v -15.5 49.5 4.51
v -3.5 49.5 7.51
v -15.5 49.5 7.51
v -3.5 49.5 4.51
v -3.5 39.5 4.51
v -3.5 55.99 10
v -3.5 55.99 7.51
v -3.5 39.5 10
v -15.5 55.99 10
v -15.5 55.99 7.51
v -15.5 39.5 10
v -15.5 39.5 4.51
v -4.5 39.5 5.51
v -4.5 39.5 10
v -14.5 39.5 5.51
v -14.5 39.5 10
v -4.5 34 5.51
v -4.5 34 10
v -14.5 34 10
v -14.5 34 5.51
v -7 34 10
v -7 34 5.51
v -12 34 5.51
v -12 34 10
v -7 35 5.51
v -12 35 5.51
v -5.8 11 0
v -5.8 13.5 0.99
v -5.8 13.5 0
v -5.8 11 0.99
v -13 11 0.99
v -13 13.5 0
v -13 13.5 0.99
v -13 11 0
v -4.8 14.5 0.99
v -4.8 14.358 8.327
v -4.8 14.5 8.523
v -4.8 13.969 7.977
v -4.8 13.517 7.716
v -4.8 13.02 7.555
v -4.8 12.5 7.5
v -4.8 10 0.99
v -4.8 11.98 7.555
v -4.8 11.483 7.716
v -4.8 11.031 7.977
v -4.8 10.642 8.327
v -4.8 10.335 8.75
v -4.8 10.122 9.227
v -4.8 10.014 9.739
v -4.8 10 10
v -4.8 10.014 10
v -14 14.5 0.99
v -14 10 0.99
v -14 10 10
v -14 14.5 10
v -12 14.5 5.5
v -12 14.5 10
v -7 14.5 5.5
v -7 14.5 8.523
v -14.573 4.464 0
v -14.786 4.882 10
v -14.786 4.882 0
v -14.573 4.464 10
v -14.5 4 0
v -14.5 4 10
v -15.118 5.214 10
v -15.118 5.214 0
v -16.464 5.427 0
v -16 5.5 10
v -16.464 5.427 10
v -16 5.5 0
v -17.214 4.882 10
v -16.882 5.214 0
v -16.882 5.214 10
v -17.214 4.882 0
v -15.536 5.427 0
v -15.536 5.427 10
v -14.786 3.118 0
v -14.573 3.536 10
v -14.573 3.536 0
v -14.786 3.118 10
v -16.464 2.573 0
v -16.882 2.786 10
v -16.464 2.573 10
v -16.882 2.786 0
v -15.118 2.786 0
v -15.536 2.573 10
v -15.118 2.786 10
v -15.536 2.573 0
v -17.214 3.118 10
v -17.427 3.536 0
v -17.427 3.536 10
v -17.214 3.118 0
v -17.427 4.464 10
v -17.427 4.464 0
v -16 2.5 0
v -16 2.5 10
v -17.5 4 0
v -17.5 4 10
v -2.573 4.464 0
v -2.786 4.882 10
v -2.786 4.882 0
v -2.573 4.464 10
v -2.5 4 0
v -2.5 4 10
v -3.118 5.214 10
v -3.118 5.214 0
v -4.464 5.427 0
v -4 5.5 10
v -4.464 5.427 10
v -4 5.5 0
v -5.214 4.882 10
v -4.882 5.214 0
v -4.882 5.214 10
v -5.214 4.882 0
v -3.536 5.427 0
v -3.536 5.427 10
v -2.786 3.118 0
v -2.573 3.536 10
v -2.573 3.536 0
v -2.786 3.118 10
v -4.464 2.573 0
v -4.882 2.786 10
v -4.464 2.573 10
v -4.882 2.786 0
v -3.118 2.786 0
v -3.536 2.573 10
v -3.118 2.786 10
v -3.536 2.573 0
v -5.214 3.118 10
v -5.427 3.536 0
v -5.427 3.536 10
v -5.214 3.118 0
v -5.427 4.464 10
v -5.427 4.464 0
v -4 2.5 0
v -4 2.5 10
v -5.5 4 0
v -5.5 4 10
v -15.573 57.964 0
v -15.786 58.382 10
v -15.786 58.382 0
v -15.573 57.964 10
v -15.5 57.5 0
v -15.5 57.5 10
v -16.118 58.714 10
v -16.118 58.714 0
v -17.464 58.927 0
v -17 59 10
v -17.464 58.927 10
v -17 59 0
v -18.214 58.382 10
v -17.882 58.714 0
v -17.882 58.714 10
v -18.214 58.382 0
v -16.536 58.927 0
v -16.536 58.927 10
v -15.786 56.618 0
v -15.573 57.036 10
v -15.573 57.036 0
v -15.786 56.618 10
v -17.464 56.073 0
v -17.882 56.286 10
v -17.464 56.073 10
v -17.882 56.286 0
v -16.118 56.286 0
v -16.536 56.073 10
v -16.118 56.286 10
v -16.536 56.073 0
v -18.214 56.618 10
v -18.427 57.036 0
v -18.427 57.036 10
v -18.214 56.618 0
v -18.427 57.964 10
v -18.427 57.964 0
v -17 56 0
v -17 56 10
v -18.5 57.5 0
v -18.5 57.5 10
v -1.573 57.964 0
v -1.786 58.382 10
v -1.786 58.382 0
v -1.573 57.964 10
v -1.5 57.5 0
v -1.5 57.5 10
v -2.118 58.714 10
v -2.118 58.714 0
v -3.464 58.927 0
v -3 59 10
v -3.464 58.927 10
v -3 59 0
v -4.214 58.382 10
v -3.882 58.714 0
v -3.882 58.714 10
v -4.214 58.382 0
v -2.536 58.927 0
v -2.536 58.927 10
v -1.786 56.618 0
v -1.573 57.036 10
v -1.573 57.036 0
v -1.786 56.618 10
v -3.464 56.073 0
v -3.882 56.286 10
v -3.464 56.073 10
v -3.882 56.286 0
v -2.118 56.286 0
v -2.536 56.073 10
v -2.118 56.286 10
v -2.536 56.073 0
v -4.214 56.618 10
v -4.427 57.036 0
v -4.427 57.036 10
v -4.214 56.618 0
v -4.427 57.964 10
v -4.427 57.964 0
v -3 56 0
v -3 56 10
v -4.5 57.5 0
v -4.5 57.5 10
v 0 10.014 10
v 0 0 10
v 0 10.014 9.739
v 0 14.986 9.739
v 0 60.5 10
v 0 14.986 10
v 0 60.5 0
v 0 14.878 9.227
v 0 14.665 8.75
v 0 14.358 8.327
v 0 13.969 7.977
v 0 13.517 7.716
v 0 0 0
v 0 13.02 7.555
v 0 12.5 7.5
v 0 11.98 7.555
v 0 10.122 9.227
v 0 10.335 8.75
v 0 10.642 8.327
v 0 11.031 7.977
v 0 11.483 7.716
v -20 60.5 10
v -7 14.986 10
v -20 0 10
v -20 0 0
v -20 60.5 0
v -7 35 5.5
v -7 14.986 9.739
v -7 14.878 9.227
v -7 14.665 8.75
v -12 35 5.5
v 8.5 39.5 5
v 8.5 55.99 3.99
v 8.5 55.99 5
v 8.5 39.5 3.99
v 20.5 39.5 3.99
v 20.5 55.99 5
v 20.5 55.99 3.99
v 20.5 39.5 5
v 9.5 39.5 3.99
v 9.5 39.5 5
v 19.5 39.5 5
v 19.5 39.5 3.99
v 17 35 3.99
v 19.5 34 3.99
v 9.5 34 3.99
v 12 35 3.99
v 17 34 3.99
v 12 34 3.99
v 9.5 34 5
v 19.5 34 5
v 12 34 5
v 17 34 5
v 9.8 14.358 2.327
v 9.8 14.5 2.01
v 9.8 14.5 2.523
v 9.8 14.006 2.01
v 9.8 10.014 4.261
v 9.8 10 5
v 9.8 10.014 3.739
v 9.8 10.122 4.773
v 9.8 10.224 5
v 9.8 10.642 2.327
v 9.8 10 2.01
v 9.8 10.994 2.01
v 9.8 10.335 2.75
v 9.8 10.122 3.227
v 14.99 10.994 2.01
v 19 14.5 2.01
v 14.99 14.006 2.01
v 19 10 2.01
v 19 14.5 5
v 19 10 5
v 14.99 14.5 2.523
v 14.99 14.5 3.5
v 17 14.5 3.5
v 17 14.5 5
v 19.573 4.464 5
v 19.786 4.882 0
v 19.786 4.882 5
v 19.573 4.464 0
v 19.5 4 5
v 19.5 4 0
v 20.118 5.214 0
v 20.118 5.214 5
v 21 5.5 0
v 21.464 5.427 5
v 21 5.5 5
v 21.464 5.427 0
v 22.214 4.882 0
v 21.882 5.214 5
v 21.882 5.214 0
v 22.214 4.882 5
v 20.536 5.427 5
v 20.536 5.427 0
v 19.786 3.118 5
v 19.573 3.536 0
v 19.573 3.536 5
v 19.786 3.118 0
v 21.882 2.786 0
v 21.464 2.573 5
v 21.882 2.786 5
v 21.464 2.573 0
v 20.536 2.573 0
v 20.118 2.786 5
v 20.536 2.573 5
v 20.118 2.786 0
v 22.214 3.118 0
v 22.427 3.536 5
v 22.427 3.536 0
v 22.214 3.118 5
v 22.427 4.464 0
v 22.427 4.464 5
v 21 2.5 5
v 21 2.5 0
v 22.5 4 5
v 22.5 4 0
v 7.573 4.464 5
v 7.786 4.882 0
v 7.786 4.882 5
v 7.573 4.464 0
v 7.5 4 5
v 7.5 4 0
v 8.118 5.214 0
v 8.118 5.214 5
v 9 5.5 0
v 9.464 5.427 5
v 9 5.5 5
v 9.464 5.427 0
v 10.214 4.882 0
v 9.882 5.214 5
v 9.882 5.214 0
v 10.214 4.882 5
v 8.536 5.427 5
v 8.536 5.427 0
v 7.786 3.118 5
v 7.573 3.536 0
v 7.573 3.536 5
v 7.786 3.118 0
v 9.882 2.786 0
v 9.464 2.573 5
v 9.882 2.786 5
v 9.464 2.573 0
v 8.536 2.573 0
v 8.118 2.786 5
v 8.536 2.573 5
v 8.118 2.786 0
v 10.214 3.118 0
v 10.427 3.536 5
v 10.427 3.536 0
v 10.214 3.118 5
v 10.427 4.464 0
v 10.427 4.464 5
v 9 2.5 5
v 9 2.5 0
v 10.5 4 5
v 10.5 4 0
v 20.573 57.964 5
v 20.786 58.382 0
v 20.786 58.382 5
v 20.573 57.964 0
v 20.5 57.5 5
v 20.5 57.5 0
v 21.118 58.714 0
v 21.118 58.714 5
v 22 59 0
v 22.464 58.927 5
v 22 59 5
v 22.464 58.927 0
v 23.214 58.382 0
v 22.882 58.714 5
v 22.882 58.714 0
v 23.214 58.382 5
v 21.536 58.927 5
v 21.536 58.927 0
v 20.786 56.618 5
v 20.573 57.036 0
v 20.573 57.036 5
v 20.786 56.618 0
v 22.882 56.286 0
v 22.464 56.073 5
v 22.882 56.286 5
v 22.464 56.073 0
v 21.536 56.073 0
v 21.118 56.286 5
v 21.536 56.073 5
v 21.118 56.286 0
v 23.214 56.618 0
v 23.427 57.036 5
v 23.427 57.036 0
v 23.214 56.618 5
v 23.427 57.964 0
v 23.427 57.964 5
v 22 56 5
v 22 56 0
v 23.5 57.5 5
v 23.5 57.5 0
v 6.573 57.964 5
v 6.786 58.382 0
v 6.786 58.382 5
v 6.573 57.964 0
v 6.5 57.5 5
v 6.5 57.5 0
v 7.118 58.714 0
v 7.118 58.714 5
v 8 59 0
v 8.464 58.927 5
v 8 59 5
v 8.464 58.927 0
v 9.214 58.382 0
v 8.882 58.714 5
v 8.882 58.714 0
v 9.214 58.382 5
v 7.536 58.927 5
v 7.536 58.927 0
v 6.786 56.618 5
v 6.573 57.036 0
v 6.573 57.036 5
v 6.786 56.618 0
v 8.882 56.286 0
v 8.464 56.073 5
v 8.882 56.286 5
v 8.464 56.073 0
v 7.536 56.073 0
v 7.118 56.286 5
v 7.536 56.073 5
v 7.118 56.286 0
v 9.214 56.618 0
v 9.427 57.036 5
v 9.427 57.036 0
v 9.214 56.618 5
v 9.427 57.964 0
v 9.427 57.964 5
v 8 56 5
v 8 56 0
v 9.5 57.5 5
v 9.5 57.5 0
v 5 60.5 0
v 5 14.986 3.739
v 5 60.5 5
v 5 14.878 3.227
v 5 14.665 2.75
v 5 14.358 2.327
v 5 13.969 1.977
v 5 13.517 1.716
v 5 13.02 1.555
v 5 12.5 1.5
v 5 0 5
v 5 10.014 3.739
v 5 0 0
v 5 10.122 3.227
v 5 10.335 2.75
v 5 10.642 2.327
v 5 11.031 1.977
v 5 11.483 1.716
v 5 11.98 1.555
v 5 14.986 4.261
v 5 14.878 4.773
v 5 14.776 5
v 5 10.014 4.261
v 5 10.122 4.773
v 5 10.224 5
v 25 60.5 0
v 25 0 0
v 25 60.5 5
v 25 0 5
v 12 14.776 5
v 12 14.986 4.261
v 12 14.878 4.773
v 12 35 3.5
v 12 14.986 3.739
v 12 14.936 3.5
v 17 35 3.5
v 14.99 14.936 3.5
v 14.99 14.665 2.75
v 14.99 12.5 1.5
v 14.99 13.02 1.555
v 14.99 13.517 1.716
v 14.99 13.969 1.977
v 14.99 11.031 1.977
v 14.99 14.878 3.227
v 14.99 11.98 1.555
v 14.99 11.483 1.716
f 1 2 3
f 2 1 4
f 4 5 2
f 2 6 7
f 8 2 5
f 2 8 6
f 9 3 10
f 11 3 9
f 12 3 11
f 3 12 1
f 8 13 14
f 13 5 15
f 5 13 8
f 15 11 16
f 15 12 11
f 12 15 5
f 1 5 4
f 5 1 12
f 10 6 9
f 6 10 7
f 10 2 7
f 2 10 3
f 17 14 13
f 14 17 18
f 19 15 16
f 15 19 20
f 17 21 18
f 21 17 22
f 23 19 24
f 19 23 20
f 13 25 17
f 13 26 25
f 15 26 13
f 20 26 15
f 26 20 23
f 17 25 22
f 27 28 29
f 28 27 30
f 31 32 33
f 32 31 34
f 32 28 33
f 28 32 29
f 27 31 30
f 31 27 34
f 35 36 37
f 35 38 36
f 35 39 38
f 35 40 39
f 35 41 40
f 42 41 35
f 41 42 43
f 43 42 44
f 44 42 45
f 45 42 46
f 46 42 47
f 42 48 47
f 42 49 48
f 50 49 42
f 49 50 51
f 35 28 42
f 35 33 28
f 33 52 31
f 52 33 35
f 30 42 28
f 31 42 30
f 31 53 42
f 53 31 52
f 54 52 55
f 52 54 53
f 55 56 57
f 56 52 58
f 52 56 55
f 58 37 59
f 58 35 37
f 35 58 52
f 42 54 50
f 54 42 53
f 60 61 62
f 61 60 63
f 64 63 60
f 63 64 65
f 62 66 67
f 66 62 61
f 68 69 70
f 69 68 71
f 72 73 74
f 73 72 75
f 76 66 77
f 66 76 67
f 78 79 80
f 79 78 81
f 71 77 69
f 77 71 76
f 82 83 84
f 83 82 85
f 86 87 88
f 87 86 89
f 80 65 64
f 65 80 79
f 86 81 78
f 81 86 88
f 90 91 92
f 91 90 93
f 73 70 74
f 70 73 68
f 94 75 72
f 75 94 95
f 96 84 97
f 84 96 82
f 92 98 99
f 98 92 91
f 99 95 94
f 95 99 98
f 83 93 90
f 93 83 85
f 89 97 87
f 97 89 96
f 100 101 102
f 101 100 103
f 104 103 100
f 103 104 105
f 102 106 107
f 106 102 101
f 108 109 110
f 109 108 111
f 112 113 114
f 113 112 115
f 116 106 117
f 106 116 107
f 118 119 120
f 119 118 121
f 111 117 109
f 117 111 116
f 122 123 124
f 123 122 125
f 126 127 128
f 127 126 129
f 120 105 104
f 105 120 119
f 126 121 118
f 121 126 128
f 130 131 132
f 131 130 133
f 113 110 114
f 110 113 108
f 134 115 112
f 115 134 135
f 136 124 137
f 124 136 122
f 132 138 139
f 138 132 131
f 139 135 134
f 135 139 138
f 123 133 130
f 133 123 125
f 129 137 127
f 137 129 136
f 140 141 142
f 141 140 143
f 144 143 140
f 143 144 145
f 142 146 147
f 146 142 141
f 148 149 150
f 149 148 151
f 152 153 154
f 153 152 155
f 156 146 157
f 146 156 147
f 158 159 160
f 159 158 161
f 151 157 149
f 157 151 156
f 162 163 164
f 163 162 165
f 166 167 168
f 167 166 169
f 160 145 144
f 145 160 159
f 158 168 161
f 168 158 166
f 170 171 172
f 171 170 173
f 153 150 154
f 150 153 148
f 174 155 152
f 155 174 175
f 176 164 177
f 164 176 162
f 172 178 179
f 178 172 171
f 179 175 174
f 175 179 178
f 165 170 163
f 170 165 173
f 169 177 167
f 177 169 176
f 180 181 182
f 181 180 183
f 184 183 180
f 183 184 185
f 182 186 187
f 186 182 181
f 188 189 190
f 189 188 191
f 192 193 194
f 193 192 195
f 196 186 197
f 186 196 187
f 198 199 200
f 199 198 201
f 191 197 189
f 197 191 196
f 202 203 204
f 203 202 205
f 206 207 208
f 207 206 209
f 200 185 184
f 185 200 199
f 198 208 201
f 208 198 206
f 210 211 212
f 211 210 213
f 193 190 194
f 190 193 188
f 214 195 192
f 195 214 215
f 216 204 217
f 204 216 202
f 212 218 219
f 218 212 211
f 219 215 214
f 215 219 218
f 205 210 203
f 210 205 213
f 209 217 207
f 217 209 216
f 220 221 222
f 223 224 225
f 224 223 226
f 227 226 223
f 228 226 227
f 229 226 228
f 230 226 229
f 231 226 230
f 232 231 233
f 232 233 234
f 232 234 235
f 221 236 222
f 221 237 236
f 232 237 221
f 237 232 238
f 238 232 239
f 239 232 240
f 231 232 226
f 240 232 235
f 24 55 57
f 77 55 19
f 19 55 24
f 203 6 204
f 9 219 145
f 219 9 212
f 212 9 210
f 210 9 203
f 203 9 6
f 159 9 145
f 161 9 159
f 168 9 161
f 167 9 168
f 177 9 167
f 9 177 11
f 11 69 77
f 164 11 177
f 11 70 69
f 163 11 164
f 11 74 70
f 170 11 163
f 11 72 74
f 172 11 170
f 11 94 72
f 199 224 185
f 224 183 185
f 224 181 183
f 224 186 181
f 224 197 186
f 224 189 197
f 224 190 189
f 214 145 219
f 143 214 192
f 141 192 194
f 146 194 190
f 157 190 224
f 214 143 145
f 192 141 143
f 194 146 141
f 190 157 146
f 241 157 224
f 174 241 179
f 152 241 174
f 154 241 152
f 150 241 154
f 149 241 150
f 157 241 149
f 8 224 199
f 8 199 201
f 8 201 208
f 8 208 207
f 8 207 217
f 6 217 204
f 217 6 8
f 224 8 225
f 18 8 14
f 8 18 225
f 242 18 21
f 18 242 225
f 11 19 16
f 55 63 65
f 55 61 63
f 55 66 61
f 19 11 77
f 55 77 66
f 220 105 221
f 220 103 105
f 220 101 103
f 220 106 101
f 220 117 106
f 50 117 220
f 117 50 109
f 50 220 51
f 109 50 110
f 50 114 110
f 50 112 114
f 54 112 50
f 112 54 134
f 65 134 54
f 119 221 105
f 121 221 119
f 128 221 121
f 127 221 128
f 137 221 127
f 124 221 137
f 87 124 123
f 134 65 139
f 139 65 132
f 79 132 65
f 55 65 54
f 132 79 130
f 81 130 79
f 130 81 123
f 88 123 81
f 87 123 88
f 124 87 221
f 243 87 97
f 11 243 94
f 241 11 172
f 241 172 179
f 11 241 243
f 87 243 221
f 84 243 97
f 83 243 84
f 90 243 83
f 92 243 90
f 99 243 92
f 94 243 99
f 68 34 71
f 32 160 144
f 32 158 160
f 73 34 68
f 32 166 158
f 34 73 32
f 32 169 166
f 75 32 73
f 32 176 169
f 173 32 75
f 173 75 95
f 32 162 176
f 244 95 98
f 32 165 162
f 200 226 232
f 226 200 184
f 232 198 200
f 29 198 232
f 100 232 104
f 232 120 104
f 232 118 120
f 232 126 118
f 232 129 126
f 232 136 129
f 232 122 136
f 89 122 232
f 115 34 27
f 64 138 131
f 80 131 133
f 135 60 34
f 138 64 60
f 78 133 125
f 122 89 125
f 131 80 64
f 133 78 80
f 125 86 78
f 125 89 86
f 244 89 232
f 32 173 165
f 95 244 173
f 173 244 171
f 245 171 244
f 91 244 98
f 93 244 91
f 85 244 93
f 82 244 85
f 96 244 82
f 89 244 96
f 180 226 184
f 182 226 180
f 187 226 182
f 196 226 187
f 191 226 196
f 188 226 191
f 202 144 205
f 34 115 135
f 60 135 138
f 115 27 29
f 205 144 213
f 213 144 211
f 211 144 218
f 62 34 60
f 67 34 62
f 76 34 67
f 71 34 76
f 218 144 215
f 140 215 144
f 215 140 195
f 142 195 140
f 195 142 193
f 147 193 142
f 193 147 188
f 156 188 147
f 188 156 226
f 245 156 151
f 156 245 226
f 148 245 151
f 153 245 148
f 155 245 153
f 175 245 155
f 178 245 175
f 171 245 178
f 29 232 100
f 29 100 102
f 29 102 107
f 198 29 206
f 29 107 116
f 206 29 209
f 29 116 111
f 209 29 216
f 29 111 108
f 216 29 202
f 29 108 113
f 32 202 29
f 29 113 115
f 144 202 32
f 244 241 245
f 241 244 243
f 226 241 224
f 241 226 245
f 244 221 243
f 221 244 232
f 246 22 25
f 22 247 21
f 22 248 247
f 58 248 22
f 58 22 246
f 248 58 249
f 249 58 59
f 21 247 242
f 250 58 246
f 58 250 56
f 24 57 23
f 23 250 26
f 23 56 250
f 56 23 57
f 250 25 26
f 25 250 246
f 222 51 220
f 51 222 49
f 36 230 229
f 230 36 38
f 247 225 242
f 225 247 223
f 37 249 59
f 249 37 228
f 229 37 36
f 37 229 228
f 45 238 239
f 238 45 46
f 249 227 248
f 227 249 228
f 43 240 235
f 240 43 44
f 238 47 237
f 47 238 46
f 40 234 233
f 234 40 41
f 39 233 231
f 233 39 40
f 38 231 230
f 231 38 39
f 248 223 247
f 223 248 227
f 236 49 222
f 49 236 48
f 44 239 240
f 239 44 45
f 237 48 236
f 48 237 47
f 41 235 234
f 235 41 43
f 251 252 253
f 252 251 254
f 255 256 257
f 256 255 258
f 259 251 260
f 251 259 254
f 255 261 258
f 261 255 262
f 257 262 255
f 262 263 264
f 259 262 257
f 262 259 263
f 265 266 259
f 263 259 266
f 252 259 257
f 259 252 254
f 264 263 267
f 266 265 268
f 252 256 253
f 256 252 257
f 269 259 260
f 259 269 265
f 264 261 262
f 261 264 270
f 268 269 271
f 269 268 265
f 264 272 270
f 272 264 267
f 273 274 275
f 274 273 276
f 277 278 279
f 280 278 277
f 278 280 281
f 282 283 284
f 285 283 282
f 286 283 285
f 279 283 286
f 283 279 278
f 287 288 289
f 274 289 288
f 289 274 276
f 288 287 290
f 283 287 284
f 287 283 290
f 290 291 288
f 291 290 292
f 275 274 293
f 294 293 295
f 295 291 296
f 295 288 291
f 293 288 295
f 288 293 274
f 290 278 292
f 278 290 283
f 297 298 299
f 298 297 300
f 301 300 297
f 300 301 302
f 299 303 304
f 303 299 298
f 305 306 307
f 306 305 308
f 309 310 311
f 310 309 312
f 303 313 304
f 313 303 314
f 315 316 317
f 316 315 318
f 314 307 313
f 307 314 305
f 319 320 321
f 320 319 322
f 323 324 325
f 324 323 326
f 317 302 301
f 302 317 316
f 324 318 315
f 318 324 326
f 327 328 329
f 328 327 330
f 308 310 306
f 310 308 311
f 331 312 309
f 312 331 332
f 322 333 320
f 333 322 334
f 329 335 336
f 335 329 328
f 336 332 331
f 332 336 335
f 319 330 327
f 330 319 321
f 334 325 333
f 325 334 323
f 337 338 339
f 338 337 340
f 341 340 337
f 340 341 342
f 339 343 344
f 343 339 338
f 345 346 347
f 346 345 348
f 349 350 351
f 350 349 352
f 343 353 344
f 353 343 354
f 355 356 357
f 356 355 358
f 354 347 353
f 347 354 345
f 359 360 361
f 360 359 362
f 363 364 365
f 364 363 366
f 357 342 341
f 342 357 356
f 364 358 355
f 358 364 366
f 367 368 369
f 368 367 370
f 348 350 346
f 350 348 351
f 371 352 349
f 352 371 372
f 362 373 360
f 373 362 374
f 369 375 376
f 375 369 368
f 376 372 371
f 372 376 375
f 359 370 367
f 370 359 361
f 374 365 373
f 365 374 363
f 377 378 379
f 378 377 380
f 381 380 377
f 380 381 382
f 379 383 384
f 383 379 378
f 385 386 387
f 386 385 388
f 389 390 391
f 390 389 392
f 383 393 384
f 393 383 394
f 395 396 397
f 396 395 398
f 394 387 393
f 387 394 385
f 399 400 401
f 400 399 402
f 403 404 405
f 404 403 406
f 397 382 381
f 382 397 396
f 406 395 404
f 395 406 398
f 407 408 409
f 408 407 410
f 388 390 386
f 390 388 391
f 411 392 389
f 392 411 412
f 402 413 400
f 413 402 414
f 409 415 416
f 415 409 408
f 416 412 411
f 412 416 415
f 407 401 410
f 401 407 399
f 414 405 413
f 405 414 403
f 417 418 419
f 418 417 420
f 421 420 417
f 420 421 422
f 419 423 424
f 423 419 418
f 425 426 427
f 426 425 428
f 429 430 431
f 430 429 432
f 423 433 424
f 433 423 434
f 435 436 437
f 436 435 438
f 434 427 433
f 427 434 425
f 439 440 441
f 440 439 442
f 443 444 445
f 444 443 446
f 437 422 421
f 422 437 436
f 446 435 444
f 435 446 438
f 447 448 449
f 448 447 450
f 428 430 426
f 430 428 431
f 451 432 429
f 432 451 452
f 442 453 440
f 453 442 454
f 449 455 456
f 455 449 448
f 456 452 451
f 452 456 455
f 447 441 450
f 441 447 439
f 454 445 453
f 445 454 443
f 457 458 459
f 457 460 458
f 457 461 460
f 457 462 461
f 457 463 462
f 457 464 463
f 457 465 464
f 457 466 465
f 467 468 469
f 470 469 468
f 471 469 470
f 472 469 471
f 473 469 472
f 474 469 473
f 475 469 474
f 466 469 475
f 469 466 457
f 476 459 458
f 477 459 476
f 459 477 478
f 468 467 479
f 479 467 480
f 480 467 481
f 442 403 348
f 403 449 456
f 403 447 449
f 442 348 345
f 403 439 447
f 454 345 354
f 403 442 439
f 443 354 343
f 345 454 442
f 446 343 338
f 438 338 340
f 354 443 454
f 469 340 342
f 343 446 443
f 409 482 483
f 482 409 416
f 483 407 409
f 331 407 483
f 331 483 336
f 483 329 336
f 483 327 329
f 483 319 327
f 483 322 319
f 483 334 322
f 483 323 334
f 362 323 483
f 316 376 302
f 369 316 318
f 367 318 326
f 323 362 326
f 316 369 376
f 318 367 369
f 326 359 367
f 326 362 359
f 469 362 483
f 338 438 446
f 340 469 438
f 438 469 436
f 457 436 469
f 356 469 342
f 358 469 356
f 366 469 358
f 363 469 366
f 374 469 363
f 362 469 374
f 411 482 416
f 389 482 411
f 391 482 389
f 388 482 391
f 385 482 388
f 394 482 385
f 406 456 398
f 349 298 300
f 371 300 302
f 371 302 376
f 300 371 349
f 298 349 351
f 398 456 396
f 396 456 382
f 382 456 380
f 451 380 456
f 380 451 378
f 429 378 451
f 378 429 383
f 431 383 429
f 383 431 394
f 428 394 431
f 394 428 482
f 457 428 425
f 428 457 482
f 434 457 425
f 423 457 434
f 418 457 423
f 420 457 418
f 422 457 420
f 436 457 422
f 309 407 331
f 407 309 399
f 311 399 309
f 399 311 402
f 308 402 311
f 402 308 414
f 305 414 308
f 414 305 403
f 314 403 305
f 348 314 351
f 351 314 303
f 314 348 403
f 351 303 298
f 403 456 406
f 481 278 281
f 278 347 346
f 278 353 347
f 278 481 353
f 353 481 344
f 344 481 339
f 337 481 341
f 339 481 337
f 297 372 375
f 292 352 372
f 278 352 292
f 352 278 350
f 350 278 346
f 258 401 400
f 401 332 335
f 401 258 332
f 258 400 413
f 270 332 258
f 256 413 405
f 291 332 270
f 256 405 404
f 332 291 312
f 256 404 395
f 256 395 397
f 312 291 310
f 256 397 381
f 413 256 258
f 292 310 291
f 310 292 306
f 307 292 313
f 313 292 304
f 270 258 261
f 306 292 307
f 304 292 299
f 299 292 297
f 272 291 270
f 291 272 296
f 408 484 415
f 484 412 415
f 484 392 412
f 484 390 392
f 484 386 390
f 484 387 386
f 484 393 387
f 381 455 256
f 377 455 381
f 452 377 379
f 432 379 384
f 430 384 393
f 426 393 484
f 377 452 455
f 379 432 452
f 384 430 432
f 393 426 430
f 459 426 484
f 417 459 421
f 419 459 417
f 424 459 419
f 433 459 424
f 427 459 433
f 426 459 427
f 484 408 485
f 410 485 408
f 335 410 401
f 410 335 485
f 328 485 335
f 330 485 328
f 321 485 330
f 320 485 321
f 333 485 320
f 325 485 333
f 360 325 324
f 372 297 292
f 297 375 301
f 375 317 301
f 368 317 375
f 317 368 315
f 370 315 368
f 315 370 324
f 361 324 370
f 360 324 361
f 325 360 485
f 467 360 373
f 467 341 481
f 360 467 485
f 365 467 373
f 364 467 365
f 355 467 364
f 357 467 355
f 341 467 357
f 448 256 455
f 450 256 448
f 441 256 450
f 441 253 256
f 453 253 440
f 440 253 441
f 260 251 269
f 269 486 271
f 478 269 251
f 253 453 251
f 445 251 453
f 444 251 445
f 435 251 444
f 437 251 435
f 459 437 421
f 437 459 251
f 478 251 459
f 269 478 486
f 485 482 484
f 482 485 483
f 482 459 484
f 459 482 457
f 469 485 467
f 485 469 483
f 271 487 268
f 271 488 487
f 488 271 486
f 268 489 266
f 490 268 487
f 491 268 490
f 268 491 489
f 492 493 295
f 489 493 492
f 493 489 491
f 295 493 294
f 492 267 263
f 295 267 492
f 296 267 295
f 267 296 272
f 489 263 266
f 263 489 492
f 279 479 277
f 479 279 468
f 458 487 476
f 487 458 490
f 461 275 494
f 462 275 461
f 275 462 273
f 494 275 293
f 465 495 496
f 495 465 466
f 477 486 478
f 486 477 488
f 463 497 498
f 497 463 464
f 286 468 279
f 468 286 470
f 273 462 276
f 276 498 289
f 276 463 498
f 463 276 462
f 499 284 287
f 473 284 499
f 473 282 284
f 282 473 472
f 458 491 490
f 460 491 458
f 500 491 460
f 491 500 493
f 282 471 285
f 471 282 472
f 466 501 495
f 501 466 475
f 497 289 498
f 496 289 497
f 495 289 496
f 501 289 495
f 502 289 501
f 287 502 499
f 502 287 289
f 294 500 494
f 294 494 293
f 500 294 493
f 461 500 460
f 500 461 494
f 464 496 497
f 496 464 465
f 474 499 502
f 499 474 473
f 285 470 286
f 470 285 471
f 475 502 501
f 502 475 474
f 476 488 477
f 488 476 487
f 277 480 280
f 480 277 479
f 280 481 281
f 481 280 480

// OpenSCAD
// file: Battery.scad
if(!part) {
part="pack";
battery_type="AA";
cols=4;

size_18650=[18,65];
size_aa=[14.5,50.5];
size_aaa=[10.5,44.5];
batsize=battery_type=="aaa"?size_aaa:(battery_type=="AA"?size_aa:size_18650);

if(part=="pack"||part=="all")
  pack(cols,battery_type);
if(part=="cap"||part=="all")
  rotate([part=="cap"?180:0,0]) cap(cols,battery_type);
if(part=="both")
{
  mirror([0,1]) mirror([1,0]) translate([5,0,battery_width(battery_type)+4]) rotate([180,0]) cap(cols,battery_type);
  translate([0,0]) pack(cols,battery_type);
}
}

module cap(cols,battery_type="18650") {
  dx=battery_width(battery_type)+1;
  dy=battery_length(battery_type)+10;
  dz=battery_width(battery_type)+2;
  difference(){
    intersection() {
      translate([-4,-4,dz-5.5]) cube([10+cols*dx,dy+8,10]);
      union() {
        translate([0,0,dz+.4]) cube([2+cols*dx,dy,1.6]);
        *mirrory(dy/2) translate([1,-2,dz-8]) cube([6+cols*dx,1.2,10]);
        mirrorx((cols*dx+2)/2) {
          translate([2,3.5,dz-8]) cube([dx*cols/2,dy-7,10]);
          mirrory(dy/2) translate([2.5,10.4,dz-4.5]) rotate([-90,0]) cylinder(d=3.8,h=8.4,$fn=30);
        }
        translate([2,1.5,dz-3.2]) cube([dx*cols-2,dy-3,4.5]);
        *for(x=[0:cols-1])
  translate([1+dx/2+dx*x,3,dz/2]) {
    rotate([-90,0]) translate([-4,dx/-2-2,-1.5]) cube([8,5,dy-3]);
  }
      }
    }
  for(x=[0:cols-1])
  translate([1+dx/2+dx*x,3,dz/2]) {
    rotate([-90,0]) cylinder(d=dx,h=dy-6,$fn=40);
  }
  }
}
module pack(cols=4,battery_type="18650") {
dx=battery_width(battery_type)+1;
dy=battery_length(battery_type)+10;
dz=battery_width(battery_type)+2;
difference(){
  cube([2+cols*dx,dy,dz]);
  for(x=[0:cols-1])
  translate([1+dx/2+dx*x,3,dz/2]) {
    rotate([-90,0]) battery(battery_type);
  }
  mirrorx((2+cols*dx)/2) mirrory(dy/2) translate([2.5,10,dz-4]) rotate([-90,0]) cylinder(d=4,h=10,$fn=30);
  translate([2,3,10]) cube([dx*cols-2,dy-6,dz]);
  translate([1.3,1.3,dz-5.99]) cube([dx*cols-.55,dy-2.6,6]);
}
}

function battery_length(type="18650") = (type=="18650"?65:(type=="AA"?50.5:(type=="AAA"?44.5:0)));
function battery_width(type="18650") = (type=="18650"?18:(type=="AA"?14.5:(type=="AAA"?10.5:0)));
module battery(type="18650",neg=1,top=0,side=0)
{
  noff=neg?4:0;
  dia=battery_width(type);
  length=battery_length(type);
  //if(type=="18650")
    {
    difference() {
      union() {
        cylinder(d=dia+(neg?0.5:0),h=length+noff,$fn=40);
        translate([dia*-.5-(neg?0.25:0),-11]) cube([dia+(neg?0.5:0),11,length+noff]);
        if(neg)
        {
          for(m=[0,1]) translate([0,0,m?length+noff:0]) mirror([0,0,m]) {
            rotate([0,0,m&&side?90*side:0])
              terminal_slot(top);
          }
        } else
        translate([0,0,length-.01+noff]) cylinder(d=dia/3,h=1.4,$fn=20);
      }
      mirrorz((length+noff)/2) translate([0,0,-3]) scale([1,1,0.5]) sphere(d=dia*.5,$fn=30);
    }
  }
}
module terminal_slot(top=0)
{
  translate([-5,-10.02,-1.7]) cube([10,17,1]);
  if(top)
    translate([-5.5,-6,-1.7]) cube([11.02,4,1]);
  translate([0,0,-.71]) {
    cylinder(d=8,h=2.02,$fn=30);
    translate([-4,-10.01]) cube([8,10,2.02]);
    translate([-5,-14.01]) cube([10,14,2.02]);
    translate([-8,-18,-1]) cube([16,14,2.02]);
  }
  translate([-3,1,-1.7]) cube([6,10,1]);
  translate([-1,-5,-1.2]) cube([2,10,2]);
  *translate([-3,8.01,-3.01]) cube([6,2,37.52]);
}

module mirrorz(offset=0)
{
  translate([0,0,offset]) for(m=[0,1]) mirror([0,0,m]) translate([0,0,offset*-1]) children();
}
module mirrory(offset=0)
{
  translate([0,offset,0]) for(m=[0,1]) mirror([0,m,0]) translate([0,offset*-1,0]) children();
}
module mirrorx(offset=0)
{
  translate([offset,0]) for(m=[0,1]) mirror([m,0]) translate([offset*-1,0]) children();
}
// main file
part="combo";
include<Battery.scad>;

*pack(4,"AA");
block2("bottom");
translate([35,0,4]) rotate([0,0,180]) rotate([180,0]) translate([30,0,-10]) block2("top");
module block2(part="bottom")
{
translate([-20,0]) difference() {
  if(part=="bottom")
    cube([20,60.5,10]);
  else translate([0,0,9]) cube([20,60.5,5]);
  translate([5,34,10.01]) mirror([0,0,1]) rotate([0,0,90]) rotate([90,0]) translate([-6,-2,-4]) regulator();
  translate([8,10,5.5]) cube([5,25,5]);
  translate([6,10,-.01]) tinyswitch();
  translate([20.01,12.5,10]) rotate([0,-90,0]) cylinder(d=5,h=10,$fn=30);
  translate([0,0,-.01]) for(pos=[[4,4],[16,4],[3,57.5],[17,57.5]])
    translate(pos) cylinder(d=3,h=20,$fn=20);
}
}
*block("top");
*block("bottom");


module block(part="bottom")
{
translate(part=="bottom"?[0,0]:[-4,0,16]) rotate([0,part=="bottom"?0:180]) difference(){
  if(part=="bottom")
    translate([0,-1]) cube2([30,30,6],2);
  else
    translate([0,0,6]) cube2([30,30,10],2);
  translate([-.01,4,6]) rotate([0,90,0]) cylinder(d=4,h=8,$fn=40);
  for(x=[4,26]) translate([x,9,-.01]) cylinder(d=3,h=20,$fn=20);
  translate([2,2,-.01]) tinyswitch();
  regulator();
}
}

module tinyswitch()
{
    translate([1,1]) cube([7.2,2.5,2]);
    translate([0,0,1]) cube([9.2,4.5,11]);
}

module regulator()
{
  union(){
  translate([11.5,2,3.5]) cube([10,5.5,12]);
  translate([20.99,2,3.5]) cube([7,2.5,12]);
  translate([6,2,4.5]) cube([7,4.5,10]);
  }
}

module cube2(dims,r=1)
{
  linear_extrude(dims[2]) {
    translate([r,0]) square([dims[0]-r*2,dims[1]]);
    translate([0,r]) square([dims[0],dims[1]-r*2]);
    for(x=[r,dims[0]-r],y=[r,dims[1]-r])
      translate([x,y]) circle(r=r,$fn=20);
  }
}
